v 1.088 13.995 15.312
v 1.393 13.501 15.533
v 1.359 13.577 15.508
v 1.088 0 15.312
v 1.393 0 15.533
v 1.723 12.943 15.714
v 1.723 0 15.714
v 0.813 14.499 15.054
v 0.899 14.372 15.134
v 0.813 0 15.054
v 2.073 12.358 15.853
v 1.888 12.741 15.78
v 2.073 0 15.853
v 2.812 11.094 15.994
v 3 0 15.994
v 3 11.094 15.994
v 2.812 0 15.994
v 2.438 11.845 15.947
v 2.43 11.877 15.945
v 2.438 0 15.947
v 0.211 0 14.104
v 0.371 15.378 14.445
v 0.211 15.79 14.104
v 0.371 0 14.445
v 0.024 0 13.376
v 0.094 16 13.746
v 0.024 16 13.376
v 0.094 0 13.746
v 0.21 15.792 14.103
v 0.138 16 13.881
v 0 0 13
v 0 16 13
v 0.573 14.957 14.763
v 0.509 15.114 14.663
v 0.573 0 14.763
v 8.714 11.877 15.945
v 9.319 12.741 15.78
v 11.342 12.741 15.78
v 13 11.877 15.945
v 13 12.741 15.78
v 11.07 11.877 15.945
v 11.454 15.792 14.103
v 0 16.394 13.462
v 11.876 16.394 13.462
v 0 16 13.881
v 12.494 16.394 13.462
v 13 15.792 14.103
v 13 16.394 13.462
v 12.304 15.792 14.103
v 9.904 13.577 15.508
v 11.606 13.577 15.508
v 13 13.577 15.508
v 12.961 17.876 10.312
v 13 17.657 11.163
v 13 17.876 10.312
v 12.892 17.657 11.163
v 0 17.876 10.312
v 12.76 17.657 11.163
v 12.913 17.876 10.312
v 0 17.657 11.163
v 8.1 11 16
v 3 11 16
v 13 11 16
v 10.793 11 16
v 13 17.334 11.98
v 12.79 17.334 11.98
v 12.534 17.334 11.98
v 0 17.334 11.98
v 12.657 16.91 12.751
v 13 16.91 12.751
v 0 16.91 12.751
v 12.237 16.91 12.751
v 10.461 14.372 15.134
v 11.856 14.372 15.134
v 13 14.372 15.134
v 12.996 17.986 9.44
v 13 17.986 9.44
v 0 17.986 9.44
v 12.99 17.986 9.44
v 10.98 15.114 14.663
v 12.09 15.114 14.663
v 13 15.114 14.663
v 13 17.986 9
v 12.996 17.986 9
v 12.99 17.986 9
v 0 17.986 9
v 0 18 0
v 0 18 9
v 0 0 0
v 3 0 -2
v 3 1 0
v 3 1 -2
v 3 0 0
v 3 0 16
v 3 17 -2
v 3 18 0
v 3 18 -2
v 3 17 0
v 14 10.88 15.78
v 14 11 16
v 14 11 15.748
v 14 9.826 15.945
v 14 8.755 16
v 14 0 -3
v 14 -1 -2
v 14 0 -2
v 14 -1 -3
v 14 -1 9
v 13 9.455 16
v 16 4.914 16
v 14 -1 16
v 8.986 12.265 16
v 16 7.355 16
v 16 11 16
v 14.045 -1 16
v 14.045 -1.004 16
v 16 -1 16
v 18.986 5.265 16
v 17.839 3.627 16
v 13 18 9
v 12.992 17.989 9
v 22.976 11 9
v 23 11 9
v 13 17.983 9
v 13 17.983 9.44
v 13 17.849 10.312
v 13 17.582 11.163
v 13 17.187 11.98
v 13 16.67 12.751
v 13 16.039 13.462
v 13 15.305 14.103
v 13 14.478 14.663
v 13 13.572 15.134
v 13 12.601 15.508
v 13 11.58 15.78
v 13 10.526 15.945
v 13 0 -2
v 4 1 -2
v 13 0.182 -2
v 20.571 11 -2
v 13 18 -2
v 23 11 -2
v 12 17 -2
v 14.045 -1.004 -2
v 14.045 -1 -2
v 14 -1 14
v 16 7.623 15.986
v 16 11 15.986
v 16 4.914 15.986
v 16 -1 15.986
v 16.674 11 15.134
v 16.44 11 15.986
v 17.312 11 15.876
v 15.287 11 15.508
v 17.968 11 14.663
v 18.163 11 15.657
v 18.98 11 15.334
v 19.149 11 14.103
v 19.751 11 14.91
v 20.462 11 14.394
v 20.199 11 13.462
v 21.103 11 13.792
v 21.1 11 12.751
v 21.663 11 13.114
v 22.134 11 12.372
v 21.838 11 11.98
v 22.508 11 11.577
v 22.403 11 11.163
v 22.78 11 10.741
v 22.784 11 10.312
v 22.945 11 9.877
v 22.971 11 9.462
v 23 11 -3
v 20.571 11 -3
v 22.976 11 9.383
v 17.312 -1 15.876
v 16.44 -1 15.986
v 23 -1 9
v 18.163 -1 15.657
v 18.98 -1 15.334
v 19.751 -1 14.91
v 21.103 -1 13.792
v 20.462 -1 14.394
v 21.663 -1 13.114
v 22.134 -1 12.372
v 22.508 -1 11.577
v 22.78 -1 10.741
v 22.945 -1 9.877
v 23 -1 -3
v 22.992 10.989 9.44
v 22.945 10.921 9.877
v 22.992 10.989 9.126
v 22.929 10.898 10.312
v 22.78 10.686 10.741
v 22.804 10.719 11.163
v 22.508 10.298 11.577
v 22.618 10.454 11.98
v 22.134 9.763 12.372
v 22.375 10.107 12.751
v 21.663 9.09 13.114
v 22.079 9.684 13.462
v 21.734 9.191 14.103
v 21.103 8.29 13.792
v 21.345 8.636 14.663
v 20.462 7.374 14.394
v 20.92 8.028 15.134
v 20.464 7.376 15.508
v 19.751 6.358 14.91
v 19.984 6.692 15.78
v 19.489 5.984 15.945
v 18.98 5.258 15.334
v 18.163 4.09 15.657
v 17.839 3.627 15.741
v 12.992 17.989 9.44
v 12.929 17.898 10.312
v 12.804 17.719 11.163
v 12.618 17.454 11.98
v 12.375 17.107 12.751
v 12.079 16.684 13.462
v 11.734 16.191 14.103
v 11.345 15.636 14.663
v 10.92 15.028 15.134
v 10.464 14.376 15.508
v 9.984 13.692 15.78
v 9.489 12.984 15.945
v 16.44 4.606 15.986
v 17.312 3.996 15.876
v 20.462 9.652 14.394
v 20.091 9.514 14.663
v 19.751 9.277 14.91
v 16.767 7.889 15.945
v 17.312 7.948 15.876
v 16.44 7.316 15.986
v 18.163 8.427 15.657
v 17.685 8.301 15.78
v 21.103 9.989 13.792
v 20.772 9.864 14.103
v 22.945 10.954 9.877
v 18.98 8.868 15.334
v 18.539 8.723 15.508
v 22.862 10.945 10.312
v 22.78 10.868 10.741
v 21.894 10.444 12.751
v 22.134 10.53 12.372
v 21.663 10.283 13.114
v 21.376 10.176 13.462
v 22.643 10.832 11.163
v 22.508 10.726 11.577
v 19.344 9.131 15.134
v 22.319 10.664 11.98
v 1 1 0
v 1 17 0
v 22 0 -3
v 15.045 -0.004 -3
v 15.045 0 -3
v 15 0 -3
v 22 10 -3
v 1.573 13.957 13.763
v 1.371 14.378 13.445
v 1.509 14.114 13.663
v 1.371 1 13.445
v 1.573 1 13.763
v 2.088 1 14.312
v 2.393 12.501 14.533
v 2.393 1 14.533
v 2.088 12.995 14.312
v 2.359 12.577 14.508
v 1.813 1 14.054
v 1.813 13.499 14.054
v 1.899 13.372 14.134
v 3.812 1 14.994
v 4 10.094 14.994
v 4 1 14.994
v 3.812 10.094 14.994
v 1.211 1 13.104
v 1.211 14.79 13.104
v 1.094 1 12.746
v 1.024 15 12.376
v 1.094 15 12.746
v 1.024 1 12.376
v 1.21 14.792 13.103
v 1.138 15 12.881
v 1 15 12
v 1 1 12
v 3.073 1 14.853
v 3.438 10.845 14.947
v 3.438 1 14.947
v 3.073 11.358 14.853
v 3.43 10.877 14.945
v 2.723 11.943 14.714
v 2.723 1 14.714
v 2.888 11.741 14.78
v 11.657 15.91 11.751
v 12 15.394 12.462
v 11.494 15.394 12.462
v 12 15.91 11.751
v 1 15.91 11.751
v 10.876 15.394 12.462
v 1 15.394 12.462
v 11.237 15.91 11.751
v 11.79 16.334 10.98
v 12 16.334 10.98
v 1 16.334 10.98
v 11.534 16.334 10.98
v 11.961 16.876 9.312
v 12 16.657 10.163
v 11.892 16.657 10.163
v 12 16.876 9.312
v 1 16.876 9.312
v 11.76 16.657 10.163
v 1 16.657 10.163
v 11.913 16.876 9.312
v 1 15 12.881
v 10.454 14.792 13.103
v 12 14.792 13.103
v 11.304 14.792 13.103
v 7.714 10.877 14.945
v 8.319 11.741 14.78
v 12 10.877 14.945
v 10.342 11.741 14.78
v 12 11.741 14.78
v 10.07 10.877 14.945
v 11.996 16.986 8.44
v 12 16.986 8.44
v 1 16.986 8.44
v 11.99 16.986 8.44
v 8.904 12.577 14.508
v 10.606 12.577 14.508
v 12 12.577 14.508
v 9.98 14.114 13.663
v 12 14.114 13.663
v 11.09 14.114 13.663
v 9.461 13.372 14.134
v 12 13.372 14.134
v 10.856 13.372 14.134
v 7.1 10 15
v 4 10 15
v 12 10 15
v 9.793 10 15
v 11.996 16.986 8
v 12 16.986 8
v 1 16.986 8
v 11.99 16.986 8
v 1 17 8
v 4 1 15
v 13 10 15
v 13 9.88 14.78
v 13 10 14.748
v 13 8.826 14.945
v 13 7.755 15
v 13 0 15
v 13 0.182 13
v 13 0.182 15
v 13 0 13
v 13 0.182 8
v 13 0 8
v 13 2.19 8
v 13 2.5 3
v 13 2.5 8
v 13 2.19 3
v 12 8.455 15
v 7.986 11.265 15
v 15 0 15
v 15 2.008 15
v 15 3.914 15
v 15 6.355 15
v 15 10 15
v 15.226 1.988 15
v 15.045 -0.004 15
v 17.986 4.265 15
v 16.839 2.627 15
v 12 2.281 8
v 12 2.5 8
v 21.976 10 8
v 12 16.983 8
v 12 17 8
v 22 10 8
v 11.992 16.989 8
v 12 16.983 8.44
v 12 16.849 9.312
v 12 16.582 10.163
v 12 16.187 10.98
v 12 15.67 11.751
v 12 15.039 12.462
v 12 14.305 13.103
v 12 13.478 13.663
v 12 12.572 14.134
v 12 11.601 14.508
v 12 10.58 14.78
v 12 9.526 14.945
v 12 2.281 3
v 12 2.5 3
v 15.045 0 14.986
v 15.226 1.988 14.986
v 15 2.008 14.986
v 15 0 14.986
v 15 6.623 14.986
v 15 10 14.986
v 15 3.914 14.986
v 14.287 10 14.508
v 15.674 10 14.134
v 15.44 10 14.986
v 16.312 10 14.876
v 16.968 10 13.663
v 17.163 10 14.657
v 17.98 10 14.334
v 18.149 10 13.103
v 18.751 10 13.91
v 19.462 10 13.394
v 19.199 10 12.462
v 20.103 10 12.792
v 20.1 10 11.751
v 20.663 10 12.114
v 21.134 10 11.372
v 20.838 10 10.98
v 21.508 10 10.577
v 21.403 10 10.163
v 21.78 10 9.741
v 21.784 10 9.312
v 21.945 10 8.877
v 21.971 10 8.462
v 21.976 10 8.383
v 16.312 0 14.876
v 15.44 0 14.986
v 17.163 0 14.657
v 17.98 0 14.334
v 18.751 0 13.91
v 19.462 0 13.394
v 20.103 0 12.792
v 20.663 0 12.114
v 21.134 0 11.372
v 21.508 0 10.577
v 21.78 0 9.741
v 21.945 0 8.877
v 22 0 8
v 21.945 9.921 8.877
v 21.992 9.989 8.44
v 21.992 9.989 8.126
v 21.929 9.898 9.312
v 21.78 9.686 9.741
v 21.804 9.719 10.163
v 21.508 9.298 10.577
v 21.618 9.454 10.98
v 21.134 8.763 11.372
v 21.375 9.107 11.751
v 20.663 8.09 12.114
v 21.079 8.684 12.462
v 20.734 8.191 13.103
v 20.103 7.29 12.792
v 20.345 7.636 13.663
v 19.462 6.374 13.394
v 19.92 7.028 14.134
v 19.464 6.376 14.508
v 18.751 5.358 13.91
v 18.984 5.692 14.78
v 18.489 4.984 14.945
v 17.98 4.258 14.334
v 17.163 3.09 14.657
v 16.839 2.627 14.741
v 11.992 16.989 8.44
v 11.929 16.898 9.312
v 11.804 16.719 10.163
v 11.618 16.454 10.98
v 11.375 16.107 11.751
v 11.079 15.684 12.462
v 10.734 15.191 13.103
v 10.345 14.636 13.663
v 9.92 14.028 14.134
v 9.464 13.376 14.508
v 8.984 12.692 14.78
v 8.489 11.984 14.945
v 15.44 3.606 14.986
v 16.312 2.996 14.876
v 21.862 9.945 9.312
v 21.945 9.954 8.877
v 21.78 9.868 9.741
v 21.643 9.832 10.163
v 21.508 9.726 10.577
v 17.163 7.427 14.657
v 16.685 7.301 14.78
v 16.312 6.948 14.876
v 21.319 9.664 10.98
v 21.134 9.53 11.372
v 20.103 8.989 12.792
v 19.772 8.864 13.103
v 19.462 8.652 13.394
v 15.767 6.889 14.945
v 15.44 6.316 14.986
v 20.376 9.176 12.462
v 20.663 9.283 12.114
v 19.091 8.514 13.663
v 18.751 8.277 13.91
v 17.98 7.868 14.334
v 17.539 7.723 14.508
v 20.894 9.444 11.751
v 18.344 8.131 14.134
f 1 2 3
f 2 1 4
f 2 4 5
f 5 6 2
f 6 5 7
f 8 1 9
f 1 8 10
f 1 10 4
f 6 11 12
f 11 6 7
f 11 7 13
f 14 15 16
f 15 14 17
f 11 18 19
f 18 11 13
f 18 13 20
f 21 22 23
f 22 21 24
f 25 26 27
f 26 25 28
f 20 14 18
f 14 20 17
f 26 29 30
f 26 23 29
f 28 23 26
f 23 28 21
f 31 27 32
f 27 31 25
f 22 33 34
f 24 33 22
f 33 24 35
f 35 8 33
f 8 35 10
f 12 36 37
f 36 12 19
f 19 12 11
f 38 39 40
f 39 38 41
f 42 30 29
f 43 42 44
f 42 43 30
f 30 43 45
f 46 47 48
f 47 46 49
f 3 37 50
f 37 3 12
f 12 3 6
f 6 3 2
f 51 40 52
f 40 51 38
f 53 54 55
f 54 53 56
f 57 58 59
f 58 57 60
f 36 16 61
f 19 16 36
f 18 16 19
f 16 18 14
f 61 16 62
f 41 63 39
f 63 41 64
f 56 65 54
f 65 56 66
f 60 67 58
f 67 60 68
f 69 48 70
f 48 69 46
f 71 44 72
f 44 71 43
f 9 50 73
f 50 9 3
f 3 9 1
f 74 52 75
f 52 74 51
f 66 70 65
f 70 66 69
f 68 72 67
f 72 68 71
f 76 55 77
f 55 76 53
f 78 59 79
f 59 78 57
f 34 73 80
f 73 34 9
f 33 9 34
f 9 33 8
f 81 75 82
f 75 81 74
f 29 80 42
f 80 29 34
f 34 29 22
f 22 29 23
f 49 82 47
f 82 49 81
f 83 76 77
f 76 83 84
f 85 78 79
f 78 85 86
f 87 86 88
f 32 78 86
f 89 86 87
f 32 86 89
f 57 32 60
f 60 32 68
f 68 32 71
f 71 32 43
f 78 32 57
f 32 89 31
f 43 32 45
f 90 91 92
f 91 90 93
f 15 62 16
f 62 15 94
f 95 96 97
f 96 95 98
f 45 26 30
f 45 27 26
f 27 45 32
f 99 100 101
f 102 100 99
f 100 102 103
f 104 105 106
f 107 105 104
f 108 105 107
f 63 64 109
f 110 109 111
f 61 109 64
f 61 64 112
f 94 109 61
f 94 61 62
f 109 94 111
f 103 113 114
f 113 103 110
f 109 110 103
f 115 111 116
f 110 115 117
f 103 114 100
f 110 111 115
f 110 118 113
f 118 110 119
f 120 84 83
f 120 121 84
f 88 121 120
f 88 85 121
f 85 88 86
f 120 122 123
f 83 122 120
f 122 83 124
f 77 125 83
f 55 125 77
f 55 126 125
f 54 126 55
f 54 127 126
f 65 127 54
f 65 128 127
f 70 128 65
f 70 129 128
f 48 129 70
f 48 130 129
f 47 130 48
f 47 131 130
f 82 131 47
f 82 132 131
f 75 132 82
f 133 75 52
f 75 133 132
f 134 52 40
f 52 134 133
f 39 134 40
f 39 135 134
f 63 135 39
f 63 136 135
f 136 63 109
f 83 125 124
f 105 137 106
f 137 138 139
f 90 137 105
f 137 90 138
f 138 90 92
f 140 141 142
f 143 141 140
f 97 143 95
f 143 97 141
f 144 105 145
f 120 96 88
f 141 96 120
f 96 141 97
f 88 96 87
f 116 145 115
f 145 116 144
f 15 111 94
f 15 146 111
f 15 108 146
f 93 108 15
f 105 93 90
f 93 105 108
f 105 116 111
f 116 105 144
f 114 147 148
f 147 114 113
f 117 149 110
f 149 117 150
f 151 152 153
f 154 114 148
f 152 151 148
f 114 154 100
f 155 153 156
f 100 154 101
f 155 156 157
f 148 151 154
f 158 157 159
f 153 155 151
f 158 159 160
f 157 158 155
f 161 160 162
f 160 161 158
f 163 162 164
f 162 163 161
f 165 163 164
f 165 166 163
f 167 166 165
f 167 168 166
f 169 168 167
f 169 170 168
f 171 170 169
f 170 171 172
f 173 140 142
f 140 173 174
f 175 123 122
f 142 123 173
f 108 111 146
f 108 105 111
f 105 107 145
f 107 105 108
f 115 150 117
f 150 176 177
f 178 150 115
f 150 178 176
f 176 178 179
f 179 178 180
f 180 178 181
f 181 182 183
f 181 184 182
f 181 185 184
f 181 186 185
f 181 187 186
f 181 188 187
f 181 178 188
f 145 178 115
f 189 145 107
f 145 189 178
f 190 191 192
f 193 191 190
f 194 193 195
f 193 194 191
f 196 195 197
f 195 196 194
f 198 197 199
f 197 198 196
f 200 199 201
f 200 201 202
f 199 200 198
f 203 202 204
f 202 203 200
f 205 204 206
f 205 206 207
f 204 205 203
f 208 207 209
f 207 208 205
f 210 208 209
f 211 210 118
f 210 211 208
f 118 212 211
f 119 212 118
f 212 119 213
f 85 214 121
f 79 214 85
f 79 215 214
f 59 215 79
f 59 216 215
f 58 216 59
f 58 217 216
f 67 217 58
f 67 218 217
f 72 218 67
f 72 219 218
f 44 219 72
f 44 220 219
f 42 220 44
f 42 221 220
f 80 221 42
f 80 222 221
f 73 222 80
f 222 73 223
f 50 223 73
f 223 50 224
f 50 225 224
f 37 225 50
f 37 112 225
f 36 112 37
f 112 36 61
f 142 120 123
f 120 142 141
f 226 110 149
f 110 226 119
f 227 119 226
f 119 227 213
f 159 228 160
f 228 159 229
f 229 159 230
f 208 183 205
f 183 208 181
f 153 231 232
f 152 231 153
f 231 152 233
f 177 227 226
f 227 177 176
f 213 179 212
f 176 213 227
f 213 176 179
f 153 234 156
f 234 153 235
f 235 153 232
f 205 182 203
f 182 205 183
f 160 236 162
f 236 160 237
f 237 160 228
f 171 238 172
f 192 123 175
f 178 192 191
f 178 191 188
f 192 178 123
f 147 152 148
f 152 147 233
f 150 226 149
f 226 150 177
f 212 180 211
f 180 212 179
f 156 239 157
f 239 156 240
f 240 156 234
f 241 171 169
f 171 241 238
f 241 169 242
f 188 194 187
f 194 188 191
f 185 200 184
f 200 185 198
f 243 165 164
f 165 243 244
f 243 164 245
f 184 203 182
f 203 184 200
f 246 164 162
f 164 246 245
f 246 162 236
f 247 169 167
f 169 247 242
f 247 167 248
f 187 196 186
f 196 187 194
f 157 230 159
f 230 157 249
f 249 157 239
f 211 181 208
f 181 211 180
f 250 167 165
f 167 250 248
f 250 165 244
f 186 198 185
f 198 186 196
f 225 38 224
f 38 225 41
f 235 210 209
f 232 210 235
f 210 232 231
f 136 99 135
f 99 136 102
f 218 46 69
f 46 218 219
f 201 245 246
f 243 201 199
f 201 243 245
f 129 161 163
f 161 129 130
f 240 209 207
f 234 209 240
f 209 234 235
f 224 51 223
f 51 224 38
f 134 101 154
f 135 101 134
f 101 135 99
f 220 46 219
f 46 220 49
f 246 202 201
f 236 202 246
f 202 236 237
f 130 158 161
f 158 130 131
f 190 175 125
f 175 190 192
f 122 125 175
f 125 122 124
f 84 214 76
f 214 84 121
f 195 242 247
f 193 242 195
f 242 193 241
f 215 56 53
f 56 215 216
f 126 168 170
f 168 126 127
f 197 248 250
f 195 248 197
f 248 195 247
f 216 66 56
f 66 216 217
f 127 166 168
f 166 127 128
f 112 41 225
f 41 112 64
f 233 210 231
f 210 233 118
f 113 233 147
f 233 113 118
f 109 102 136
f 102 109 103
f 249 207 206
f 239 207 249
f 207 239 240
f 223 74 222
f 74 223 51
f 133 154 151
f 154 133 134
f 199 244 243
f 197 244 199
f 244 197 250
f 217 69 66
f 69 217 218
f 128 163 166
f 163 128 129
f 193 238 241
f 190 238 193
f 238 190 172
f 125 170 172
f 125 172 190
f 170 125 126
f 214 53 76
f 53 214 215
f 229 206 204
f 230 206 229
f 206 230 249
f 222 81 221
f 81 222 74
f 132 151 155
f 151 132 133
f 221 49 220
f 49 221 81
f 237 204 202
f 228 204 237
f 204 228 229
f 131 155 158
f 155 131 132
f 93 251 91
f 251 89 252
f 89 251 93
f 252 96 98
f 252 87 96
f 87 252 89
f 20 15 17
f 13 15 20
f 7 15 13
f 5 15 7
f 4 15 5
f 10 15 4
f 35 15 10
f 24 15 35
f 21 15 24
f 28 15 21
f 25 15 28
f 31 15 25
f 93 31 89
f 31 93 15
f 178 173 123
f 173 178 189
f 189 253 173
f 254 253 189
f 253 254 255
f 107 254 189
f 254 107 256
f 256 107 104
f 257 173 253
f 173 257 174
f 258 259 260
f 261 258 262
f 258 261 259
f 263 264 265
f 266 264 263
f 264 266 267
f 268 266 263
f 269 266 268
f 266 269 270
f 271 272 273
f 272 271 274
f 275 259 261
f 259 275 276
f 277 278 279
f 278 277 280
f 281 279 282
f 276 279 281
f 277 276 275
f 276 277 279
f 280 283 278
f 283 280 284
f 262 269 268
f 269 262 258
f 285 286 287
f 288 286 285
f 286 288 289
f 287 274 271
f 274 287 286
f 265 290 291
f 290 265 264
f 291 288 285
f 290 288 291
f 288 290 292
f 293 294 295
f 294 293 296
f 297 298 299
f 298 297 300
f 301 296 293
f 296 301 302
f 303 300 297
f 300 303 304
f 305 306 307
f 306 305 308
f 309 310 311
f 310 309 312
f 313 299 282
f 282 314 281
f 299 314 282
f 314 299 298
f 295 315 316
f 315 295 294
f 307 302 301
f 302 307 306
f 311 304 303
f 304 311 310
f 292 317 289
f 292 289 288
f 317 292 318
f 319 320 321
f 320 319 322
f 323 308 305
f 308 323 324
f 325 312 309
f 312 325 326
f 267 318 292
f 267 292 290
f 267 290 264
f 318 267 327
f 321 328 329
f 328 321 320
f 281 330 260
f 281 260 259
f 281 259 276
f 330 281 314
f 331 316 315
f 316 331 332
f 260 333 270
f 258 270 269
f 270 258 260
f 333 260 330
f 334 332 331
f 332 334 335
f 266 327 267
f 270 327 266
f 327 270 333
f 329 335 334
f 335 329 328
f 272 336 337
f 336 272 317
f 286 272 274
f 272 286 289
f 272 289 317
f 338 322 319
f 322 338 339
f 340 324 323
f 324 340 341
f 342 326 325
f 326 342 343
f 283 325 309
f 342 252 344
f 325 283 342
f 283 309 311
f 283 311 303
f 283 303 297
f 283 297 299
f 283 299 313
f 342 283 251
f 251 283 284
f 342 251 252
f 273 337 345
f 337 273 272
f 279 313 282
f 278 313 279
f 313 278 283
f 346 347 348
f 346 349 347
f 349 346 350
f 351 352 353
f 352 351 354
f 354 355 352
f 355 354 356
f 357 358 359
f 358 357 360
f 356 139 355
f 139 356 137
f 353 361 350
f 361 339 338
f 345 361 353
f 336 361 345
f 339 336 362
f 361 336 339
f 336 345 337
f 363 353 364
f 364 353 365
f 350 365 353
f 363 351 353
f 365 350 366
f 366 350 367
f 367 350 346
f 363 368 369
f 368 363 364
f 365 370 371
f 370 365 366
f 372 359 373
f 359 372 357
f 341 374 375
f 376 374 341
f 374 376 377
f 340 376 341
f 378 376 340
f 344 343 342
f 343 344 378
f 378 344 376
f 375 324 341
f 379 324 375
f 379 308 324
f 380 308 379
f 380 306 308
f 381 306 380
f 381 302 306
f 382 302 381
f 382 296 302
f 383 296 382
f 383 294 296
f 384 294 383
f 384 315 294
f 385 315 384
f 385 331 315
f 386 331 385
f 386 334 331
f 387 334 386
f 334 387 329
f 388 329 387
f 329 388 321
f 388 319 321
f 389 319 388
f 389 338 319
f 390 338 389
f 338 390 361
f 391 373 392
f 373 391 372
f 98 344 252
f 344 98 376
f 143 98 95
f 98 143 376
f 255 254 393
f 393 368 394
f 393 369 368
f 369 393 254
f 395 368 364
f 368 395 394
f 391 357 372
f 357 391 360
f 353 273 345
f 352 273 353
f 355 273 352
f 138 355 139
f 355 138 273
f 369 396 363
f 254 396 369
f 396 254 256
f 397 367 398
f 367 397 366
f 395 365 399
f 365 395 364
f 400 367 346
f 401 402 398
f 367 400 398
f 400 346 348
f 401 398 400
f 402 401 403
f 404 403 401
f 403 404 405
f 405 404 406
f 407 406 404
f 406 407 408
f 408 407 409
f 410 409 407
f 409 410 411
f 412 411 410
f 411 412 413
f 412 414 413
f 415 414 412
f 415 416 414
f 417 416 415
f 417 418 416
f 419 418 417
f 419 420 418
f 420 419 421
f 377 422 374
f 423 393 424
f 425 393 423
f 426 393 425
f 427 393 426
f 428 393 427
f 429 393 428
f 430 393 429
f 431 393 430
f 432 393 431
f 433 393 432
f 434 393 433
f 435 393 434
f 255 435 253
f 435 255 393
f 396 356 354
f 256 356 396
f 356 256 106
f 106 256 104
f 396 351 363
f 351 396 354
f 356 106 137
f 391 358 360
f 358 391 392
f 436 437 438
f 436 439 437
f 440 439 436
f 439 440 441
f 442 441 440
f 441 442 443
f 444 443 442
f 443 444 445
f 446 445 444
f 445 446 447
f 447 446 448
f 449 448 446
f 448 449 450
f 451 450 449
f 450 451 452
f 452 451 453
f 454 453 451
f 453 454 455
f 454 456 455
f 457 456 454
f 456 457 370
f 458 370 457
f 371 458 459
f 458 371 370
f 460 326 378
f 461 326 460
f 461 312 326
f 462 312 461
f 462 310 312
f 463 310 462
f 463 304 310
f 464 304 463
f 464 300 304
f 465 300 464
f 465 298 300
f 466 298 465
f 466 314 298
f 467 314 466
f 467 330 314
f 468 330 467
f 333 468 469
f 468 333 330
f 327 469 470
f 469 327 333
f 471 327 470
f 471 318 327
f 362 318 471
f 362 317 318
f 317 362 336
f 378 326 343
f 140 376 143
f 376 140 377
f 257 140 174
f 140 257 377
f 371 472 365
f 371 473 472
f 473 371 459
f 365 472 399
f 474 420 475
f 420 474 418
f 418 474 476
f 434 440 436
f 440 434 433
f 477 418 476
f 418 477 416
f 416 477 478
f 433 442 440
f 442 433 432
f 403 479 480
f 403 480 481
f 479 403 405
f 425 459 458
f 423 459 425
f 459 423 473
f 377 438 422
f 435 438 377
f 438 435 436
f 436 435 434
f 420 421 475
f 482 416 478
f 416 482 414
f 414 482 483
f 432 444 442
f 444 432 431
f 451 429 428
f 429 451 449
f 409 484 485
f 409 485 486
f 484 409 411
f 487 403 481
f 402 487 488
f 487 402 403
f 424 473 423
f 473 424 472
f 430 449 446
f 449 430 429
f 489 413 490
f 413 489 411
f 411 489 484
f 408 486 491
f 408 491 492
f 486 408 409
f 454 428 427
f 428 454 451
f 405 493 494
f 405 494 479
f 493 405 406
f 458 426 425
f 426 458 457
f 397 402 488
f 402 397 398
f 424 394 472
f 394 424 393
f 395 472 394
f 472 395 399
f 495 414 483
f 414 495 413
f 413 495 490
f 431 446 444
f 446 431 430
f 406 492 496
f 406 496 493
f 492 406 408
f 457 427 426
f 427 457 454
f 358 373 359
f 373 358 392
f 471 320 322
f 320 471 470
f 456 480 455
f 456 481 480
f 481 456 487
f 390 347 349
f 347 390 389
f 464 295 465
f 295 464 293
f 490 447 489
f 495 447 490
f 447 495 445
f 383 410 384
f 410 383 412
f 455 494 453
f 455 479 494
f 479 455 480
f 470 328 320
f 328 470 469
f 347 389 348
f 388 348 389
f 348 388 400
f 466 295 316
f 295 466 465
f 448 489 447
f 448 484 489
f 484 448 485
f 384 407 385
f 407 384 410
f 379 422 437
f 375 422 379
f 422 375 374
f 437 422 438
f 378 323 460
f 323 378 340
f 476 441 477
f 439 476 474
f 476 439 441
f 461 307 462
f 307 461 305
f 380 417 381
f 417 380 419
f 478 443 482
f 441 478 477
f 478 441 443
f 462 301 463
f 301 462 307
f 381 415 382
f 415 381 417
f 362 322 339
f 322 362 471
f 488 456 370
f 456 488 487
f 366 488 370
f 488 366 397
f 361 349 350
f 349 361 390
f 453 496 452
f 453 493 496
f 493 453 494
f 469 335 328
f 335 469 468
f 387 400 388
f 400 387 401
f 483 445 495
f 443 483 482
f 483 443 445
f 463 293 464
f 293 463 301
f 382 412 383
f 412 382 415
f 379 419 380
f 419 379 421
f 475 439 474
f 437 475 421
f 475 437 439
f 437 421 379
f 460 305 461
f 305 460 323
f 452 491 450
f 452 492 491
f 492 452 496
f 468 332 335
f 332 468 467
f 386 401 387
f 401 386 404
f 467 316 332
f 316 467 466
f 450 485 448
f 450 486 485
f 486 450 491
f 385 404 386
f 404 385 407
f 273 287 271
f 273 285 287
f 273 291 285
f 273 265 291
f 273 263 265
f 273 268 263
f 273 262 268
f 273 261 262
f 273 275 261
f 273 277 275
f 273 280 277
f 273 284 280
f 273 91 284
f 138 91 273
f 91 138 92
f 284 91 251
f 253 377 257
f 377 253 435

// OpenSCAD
$fn=50;
module cap() {
    module cap_shape(width,depth,height) {
        module slanted_cylinder(s_offset,length) {
            translate([width-10,depth,-2]) {
                rotate([0,0,-atan(7/10)]){
                    difference() {
                        translate([s_offset,-7,height-5]) {
                            rotate([0,90,0]){
                                cylinder(r=7,h=length);
                            }
                        }
                        translate([s_offset,-14,0]) {
                            cube([length,7,height]);
                        }
                    }
                }
            }
        }
        module right_cylinder(height_) {
            translate([width-9,-1,-3]){
                difference(){
                    translate([2,0,height-4]){
                        rotate([270,0,0]){
                            cylinder(r=7,h=height_);
                        }
                    }
                    translate([-6,-0.5,0]){
                        cube([6,3,height+3]);
                    }
                }
            }
        }
        // Left corner + rounded top
        cube([3,depth-2,height-3]);
        translate([3,0,height-3]){
            rotate([270,0,0]){
                cylinder(r=3,h=depth-7);
            }
        }
        intersection(){
            translate([3,0,height-3]){
                rotate([270,0,0]){
                    cylinder(r=3,h=depth);
                }
            }
            translate([0,depth-7,height-7]){
                rotate([0,90,0]){
                    cylinder(r=7,h=16);
                }
            }
        }
        translate([0,depth-2,0]){
            cube([3,2,height-7]);
        }
        difference(){
            translate([0,depth-7,height-7]){
                rotate([0,90,0]){
                    cylinder(r=7,h=3);
                }
            }
            
            cube([3,depth-2,height*2]);
        }
        // Middle bit
        translate([3,0,-2]) {
            cube([width-13,depth,height-5]);
            translate([0,0,height-5]){
                cube([width-12,depth-10,7]);
                cube([width-13,depth-7,7]);
            }
            rotate([0,0,-atan(1/11)]){
                cube([sqrt((11*11)+2),2,height+2]);
            }
            translate([0,depth-7,height-5]){
                rotate([0,90,0]){
                    cylinder(r=7,h=width-13);
                }
            }
            //closing some holes
            translate([width-12,-1,height]){
                cube([2,depth-6,2]);
            }
            cube([width-7,depth-7,height-10]);
        }
        // Right straight bit
        translate([width-9,-1,-3]){
            cube([9,depth-6,height-4]);
        }
        // Right-far slant
        l=sqrt((10*10)+(7*7));
        translate([width-10,depth,-2]) {
            rotate([0,0,-atan(7/10)]){
                translate([0,-7,0]){
                    cube([l,7,height-5]);
                    translate([0,-2,2]){
                        cube([l,2,height]);
                    }
                }
            }
        }
        right_cylinder(depth-6);   
        slanted_cylinder(0,l);     
    }
    difference(){
        cap_shape(width=23,depth=18,height=16);
        translate([1,1,-2]){
            cap_shape(width=21,depth=16,height=17);
        }
    }
}
cap();
